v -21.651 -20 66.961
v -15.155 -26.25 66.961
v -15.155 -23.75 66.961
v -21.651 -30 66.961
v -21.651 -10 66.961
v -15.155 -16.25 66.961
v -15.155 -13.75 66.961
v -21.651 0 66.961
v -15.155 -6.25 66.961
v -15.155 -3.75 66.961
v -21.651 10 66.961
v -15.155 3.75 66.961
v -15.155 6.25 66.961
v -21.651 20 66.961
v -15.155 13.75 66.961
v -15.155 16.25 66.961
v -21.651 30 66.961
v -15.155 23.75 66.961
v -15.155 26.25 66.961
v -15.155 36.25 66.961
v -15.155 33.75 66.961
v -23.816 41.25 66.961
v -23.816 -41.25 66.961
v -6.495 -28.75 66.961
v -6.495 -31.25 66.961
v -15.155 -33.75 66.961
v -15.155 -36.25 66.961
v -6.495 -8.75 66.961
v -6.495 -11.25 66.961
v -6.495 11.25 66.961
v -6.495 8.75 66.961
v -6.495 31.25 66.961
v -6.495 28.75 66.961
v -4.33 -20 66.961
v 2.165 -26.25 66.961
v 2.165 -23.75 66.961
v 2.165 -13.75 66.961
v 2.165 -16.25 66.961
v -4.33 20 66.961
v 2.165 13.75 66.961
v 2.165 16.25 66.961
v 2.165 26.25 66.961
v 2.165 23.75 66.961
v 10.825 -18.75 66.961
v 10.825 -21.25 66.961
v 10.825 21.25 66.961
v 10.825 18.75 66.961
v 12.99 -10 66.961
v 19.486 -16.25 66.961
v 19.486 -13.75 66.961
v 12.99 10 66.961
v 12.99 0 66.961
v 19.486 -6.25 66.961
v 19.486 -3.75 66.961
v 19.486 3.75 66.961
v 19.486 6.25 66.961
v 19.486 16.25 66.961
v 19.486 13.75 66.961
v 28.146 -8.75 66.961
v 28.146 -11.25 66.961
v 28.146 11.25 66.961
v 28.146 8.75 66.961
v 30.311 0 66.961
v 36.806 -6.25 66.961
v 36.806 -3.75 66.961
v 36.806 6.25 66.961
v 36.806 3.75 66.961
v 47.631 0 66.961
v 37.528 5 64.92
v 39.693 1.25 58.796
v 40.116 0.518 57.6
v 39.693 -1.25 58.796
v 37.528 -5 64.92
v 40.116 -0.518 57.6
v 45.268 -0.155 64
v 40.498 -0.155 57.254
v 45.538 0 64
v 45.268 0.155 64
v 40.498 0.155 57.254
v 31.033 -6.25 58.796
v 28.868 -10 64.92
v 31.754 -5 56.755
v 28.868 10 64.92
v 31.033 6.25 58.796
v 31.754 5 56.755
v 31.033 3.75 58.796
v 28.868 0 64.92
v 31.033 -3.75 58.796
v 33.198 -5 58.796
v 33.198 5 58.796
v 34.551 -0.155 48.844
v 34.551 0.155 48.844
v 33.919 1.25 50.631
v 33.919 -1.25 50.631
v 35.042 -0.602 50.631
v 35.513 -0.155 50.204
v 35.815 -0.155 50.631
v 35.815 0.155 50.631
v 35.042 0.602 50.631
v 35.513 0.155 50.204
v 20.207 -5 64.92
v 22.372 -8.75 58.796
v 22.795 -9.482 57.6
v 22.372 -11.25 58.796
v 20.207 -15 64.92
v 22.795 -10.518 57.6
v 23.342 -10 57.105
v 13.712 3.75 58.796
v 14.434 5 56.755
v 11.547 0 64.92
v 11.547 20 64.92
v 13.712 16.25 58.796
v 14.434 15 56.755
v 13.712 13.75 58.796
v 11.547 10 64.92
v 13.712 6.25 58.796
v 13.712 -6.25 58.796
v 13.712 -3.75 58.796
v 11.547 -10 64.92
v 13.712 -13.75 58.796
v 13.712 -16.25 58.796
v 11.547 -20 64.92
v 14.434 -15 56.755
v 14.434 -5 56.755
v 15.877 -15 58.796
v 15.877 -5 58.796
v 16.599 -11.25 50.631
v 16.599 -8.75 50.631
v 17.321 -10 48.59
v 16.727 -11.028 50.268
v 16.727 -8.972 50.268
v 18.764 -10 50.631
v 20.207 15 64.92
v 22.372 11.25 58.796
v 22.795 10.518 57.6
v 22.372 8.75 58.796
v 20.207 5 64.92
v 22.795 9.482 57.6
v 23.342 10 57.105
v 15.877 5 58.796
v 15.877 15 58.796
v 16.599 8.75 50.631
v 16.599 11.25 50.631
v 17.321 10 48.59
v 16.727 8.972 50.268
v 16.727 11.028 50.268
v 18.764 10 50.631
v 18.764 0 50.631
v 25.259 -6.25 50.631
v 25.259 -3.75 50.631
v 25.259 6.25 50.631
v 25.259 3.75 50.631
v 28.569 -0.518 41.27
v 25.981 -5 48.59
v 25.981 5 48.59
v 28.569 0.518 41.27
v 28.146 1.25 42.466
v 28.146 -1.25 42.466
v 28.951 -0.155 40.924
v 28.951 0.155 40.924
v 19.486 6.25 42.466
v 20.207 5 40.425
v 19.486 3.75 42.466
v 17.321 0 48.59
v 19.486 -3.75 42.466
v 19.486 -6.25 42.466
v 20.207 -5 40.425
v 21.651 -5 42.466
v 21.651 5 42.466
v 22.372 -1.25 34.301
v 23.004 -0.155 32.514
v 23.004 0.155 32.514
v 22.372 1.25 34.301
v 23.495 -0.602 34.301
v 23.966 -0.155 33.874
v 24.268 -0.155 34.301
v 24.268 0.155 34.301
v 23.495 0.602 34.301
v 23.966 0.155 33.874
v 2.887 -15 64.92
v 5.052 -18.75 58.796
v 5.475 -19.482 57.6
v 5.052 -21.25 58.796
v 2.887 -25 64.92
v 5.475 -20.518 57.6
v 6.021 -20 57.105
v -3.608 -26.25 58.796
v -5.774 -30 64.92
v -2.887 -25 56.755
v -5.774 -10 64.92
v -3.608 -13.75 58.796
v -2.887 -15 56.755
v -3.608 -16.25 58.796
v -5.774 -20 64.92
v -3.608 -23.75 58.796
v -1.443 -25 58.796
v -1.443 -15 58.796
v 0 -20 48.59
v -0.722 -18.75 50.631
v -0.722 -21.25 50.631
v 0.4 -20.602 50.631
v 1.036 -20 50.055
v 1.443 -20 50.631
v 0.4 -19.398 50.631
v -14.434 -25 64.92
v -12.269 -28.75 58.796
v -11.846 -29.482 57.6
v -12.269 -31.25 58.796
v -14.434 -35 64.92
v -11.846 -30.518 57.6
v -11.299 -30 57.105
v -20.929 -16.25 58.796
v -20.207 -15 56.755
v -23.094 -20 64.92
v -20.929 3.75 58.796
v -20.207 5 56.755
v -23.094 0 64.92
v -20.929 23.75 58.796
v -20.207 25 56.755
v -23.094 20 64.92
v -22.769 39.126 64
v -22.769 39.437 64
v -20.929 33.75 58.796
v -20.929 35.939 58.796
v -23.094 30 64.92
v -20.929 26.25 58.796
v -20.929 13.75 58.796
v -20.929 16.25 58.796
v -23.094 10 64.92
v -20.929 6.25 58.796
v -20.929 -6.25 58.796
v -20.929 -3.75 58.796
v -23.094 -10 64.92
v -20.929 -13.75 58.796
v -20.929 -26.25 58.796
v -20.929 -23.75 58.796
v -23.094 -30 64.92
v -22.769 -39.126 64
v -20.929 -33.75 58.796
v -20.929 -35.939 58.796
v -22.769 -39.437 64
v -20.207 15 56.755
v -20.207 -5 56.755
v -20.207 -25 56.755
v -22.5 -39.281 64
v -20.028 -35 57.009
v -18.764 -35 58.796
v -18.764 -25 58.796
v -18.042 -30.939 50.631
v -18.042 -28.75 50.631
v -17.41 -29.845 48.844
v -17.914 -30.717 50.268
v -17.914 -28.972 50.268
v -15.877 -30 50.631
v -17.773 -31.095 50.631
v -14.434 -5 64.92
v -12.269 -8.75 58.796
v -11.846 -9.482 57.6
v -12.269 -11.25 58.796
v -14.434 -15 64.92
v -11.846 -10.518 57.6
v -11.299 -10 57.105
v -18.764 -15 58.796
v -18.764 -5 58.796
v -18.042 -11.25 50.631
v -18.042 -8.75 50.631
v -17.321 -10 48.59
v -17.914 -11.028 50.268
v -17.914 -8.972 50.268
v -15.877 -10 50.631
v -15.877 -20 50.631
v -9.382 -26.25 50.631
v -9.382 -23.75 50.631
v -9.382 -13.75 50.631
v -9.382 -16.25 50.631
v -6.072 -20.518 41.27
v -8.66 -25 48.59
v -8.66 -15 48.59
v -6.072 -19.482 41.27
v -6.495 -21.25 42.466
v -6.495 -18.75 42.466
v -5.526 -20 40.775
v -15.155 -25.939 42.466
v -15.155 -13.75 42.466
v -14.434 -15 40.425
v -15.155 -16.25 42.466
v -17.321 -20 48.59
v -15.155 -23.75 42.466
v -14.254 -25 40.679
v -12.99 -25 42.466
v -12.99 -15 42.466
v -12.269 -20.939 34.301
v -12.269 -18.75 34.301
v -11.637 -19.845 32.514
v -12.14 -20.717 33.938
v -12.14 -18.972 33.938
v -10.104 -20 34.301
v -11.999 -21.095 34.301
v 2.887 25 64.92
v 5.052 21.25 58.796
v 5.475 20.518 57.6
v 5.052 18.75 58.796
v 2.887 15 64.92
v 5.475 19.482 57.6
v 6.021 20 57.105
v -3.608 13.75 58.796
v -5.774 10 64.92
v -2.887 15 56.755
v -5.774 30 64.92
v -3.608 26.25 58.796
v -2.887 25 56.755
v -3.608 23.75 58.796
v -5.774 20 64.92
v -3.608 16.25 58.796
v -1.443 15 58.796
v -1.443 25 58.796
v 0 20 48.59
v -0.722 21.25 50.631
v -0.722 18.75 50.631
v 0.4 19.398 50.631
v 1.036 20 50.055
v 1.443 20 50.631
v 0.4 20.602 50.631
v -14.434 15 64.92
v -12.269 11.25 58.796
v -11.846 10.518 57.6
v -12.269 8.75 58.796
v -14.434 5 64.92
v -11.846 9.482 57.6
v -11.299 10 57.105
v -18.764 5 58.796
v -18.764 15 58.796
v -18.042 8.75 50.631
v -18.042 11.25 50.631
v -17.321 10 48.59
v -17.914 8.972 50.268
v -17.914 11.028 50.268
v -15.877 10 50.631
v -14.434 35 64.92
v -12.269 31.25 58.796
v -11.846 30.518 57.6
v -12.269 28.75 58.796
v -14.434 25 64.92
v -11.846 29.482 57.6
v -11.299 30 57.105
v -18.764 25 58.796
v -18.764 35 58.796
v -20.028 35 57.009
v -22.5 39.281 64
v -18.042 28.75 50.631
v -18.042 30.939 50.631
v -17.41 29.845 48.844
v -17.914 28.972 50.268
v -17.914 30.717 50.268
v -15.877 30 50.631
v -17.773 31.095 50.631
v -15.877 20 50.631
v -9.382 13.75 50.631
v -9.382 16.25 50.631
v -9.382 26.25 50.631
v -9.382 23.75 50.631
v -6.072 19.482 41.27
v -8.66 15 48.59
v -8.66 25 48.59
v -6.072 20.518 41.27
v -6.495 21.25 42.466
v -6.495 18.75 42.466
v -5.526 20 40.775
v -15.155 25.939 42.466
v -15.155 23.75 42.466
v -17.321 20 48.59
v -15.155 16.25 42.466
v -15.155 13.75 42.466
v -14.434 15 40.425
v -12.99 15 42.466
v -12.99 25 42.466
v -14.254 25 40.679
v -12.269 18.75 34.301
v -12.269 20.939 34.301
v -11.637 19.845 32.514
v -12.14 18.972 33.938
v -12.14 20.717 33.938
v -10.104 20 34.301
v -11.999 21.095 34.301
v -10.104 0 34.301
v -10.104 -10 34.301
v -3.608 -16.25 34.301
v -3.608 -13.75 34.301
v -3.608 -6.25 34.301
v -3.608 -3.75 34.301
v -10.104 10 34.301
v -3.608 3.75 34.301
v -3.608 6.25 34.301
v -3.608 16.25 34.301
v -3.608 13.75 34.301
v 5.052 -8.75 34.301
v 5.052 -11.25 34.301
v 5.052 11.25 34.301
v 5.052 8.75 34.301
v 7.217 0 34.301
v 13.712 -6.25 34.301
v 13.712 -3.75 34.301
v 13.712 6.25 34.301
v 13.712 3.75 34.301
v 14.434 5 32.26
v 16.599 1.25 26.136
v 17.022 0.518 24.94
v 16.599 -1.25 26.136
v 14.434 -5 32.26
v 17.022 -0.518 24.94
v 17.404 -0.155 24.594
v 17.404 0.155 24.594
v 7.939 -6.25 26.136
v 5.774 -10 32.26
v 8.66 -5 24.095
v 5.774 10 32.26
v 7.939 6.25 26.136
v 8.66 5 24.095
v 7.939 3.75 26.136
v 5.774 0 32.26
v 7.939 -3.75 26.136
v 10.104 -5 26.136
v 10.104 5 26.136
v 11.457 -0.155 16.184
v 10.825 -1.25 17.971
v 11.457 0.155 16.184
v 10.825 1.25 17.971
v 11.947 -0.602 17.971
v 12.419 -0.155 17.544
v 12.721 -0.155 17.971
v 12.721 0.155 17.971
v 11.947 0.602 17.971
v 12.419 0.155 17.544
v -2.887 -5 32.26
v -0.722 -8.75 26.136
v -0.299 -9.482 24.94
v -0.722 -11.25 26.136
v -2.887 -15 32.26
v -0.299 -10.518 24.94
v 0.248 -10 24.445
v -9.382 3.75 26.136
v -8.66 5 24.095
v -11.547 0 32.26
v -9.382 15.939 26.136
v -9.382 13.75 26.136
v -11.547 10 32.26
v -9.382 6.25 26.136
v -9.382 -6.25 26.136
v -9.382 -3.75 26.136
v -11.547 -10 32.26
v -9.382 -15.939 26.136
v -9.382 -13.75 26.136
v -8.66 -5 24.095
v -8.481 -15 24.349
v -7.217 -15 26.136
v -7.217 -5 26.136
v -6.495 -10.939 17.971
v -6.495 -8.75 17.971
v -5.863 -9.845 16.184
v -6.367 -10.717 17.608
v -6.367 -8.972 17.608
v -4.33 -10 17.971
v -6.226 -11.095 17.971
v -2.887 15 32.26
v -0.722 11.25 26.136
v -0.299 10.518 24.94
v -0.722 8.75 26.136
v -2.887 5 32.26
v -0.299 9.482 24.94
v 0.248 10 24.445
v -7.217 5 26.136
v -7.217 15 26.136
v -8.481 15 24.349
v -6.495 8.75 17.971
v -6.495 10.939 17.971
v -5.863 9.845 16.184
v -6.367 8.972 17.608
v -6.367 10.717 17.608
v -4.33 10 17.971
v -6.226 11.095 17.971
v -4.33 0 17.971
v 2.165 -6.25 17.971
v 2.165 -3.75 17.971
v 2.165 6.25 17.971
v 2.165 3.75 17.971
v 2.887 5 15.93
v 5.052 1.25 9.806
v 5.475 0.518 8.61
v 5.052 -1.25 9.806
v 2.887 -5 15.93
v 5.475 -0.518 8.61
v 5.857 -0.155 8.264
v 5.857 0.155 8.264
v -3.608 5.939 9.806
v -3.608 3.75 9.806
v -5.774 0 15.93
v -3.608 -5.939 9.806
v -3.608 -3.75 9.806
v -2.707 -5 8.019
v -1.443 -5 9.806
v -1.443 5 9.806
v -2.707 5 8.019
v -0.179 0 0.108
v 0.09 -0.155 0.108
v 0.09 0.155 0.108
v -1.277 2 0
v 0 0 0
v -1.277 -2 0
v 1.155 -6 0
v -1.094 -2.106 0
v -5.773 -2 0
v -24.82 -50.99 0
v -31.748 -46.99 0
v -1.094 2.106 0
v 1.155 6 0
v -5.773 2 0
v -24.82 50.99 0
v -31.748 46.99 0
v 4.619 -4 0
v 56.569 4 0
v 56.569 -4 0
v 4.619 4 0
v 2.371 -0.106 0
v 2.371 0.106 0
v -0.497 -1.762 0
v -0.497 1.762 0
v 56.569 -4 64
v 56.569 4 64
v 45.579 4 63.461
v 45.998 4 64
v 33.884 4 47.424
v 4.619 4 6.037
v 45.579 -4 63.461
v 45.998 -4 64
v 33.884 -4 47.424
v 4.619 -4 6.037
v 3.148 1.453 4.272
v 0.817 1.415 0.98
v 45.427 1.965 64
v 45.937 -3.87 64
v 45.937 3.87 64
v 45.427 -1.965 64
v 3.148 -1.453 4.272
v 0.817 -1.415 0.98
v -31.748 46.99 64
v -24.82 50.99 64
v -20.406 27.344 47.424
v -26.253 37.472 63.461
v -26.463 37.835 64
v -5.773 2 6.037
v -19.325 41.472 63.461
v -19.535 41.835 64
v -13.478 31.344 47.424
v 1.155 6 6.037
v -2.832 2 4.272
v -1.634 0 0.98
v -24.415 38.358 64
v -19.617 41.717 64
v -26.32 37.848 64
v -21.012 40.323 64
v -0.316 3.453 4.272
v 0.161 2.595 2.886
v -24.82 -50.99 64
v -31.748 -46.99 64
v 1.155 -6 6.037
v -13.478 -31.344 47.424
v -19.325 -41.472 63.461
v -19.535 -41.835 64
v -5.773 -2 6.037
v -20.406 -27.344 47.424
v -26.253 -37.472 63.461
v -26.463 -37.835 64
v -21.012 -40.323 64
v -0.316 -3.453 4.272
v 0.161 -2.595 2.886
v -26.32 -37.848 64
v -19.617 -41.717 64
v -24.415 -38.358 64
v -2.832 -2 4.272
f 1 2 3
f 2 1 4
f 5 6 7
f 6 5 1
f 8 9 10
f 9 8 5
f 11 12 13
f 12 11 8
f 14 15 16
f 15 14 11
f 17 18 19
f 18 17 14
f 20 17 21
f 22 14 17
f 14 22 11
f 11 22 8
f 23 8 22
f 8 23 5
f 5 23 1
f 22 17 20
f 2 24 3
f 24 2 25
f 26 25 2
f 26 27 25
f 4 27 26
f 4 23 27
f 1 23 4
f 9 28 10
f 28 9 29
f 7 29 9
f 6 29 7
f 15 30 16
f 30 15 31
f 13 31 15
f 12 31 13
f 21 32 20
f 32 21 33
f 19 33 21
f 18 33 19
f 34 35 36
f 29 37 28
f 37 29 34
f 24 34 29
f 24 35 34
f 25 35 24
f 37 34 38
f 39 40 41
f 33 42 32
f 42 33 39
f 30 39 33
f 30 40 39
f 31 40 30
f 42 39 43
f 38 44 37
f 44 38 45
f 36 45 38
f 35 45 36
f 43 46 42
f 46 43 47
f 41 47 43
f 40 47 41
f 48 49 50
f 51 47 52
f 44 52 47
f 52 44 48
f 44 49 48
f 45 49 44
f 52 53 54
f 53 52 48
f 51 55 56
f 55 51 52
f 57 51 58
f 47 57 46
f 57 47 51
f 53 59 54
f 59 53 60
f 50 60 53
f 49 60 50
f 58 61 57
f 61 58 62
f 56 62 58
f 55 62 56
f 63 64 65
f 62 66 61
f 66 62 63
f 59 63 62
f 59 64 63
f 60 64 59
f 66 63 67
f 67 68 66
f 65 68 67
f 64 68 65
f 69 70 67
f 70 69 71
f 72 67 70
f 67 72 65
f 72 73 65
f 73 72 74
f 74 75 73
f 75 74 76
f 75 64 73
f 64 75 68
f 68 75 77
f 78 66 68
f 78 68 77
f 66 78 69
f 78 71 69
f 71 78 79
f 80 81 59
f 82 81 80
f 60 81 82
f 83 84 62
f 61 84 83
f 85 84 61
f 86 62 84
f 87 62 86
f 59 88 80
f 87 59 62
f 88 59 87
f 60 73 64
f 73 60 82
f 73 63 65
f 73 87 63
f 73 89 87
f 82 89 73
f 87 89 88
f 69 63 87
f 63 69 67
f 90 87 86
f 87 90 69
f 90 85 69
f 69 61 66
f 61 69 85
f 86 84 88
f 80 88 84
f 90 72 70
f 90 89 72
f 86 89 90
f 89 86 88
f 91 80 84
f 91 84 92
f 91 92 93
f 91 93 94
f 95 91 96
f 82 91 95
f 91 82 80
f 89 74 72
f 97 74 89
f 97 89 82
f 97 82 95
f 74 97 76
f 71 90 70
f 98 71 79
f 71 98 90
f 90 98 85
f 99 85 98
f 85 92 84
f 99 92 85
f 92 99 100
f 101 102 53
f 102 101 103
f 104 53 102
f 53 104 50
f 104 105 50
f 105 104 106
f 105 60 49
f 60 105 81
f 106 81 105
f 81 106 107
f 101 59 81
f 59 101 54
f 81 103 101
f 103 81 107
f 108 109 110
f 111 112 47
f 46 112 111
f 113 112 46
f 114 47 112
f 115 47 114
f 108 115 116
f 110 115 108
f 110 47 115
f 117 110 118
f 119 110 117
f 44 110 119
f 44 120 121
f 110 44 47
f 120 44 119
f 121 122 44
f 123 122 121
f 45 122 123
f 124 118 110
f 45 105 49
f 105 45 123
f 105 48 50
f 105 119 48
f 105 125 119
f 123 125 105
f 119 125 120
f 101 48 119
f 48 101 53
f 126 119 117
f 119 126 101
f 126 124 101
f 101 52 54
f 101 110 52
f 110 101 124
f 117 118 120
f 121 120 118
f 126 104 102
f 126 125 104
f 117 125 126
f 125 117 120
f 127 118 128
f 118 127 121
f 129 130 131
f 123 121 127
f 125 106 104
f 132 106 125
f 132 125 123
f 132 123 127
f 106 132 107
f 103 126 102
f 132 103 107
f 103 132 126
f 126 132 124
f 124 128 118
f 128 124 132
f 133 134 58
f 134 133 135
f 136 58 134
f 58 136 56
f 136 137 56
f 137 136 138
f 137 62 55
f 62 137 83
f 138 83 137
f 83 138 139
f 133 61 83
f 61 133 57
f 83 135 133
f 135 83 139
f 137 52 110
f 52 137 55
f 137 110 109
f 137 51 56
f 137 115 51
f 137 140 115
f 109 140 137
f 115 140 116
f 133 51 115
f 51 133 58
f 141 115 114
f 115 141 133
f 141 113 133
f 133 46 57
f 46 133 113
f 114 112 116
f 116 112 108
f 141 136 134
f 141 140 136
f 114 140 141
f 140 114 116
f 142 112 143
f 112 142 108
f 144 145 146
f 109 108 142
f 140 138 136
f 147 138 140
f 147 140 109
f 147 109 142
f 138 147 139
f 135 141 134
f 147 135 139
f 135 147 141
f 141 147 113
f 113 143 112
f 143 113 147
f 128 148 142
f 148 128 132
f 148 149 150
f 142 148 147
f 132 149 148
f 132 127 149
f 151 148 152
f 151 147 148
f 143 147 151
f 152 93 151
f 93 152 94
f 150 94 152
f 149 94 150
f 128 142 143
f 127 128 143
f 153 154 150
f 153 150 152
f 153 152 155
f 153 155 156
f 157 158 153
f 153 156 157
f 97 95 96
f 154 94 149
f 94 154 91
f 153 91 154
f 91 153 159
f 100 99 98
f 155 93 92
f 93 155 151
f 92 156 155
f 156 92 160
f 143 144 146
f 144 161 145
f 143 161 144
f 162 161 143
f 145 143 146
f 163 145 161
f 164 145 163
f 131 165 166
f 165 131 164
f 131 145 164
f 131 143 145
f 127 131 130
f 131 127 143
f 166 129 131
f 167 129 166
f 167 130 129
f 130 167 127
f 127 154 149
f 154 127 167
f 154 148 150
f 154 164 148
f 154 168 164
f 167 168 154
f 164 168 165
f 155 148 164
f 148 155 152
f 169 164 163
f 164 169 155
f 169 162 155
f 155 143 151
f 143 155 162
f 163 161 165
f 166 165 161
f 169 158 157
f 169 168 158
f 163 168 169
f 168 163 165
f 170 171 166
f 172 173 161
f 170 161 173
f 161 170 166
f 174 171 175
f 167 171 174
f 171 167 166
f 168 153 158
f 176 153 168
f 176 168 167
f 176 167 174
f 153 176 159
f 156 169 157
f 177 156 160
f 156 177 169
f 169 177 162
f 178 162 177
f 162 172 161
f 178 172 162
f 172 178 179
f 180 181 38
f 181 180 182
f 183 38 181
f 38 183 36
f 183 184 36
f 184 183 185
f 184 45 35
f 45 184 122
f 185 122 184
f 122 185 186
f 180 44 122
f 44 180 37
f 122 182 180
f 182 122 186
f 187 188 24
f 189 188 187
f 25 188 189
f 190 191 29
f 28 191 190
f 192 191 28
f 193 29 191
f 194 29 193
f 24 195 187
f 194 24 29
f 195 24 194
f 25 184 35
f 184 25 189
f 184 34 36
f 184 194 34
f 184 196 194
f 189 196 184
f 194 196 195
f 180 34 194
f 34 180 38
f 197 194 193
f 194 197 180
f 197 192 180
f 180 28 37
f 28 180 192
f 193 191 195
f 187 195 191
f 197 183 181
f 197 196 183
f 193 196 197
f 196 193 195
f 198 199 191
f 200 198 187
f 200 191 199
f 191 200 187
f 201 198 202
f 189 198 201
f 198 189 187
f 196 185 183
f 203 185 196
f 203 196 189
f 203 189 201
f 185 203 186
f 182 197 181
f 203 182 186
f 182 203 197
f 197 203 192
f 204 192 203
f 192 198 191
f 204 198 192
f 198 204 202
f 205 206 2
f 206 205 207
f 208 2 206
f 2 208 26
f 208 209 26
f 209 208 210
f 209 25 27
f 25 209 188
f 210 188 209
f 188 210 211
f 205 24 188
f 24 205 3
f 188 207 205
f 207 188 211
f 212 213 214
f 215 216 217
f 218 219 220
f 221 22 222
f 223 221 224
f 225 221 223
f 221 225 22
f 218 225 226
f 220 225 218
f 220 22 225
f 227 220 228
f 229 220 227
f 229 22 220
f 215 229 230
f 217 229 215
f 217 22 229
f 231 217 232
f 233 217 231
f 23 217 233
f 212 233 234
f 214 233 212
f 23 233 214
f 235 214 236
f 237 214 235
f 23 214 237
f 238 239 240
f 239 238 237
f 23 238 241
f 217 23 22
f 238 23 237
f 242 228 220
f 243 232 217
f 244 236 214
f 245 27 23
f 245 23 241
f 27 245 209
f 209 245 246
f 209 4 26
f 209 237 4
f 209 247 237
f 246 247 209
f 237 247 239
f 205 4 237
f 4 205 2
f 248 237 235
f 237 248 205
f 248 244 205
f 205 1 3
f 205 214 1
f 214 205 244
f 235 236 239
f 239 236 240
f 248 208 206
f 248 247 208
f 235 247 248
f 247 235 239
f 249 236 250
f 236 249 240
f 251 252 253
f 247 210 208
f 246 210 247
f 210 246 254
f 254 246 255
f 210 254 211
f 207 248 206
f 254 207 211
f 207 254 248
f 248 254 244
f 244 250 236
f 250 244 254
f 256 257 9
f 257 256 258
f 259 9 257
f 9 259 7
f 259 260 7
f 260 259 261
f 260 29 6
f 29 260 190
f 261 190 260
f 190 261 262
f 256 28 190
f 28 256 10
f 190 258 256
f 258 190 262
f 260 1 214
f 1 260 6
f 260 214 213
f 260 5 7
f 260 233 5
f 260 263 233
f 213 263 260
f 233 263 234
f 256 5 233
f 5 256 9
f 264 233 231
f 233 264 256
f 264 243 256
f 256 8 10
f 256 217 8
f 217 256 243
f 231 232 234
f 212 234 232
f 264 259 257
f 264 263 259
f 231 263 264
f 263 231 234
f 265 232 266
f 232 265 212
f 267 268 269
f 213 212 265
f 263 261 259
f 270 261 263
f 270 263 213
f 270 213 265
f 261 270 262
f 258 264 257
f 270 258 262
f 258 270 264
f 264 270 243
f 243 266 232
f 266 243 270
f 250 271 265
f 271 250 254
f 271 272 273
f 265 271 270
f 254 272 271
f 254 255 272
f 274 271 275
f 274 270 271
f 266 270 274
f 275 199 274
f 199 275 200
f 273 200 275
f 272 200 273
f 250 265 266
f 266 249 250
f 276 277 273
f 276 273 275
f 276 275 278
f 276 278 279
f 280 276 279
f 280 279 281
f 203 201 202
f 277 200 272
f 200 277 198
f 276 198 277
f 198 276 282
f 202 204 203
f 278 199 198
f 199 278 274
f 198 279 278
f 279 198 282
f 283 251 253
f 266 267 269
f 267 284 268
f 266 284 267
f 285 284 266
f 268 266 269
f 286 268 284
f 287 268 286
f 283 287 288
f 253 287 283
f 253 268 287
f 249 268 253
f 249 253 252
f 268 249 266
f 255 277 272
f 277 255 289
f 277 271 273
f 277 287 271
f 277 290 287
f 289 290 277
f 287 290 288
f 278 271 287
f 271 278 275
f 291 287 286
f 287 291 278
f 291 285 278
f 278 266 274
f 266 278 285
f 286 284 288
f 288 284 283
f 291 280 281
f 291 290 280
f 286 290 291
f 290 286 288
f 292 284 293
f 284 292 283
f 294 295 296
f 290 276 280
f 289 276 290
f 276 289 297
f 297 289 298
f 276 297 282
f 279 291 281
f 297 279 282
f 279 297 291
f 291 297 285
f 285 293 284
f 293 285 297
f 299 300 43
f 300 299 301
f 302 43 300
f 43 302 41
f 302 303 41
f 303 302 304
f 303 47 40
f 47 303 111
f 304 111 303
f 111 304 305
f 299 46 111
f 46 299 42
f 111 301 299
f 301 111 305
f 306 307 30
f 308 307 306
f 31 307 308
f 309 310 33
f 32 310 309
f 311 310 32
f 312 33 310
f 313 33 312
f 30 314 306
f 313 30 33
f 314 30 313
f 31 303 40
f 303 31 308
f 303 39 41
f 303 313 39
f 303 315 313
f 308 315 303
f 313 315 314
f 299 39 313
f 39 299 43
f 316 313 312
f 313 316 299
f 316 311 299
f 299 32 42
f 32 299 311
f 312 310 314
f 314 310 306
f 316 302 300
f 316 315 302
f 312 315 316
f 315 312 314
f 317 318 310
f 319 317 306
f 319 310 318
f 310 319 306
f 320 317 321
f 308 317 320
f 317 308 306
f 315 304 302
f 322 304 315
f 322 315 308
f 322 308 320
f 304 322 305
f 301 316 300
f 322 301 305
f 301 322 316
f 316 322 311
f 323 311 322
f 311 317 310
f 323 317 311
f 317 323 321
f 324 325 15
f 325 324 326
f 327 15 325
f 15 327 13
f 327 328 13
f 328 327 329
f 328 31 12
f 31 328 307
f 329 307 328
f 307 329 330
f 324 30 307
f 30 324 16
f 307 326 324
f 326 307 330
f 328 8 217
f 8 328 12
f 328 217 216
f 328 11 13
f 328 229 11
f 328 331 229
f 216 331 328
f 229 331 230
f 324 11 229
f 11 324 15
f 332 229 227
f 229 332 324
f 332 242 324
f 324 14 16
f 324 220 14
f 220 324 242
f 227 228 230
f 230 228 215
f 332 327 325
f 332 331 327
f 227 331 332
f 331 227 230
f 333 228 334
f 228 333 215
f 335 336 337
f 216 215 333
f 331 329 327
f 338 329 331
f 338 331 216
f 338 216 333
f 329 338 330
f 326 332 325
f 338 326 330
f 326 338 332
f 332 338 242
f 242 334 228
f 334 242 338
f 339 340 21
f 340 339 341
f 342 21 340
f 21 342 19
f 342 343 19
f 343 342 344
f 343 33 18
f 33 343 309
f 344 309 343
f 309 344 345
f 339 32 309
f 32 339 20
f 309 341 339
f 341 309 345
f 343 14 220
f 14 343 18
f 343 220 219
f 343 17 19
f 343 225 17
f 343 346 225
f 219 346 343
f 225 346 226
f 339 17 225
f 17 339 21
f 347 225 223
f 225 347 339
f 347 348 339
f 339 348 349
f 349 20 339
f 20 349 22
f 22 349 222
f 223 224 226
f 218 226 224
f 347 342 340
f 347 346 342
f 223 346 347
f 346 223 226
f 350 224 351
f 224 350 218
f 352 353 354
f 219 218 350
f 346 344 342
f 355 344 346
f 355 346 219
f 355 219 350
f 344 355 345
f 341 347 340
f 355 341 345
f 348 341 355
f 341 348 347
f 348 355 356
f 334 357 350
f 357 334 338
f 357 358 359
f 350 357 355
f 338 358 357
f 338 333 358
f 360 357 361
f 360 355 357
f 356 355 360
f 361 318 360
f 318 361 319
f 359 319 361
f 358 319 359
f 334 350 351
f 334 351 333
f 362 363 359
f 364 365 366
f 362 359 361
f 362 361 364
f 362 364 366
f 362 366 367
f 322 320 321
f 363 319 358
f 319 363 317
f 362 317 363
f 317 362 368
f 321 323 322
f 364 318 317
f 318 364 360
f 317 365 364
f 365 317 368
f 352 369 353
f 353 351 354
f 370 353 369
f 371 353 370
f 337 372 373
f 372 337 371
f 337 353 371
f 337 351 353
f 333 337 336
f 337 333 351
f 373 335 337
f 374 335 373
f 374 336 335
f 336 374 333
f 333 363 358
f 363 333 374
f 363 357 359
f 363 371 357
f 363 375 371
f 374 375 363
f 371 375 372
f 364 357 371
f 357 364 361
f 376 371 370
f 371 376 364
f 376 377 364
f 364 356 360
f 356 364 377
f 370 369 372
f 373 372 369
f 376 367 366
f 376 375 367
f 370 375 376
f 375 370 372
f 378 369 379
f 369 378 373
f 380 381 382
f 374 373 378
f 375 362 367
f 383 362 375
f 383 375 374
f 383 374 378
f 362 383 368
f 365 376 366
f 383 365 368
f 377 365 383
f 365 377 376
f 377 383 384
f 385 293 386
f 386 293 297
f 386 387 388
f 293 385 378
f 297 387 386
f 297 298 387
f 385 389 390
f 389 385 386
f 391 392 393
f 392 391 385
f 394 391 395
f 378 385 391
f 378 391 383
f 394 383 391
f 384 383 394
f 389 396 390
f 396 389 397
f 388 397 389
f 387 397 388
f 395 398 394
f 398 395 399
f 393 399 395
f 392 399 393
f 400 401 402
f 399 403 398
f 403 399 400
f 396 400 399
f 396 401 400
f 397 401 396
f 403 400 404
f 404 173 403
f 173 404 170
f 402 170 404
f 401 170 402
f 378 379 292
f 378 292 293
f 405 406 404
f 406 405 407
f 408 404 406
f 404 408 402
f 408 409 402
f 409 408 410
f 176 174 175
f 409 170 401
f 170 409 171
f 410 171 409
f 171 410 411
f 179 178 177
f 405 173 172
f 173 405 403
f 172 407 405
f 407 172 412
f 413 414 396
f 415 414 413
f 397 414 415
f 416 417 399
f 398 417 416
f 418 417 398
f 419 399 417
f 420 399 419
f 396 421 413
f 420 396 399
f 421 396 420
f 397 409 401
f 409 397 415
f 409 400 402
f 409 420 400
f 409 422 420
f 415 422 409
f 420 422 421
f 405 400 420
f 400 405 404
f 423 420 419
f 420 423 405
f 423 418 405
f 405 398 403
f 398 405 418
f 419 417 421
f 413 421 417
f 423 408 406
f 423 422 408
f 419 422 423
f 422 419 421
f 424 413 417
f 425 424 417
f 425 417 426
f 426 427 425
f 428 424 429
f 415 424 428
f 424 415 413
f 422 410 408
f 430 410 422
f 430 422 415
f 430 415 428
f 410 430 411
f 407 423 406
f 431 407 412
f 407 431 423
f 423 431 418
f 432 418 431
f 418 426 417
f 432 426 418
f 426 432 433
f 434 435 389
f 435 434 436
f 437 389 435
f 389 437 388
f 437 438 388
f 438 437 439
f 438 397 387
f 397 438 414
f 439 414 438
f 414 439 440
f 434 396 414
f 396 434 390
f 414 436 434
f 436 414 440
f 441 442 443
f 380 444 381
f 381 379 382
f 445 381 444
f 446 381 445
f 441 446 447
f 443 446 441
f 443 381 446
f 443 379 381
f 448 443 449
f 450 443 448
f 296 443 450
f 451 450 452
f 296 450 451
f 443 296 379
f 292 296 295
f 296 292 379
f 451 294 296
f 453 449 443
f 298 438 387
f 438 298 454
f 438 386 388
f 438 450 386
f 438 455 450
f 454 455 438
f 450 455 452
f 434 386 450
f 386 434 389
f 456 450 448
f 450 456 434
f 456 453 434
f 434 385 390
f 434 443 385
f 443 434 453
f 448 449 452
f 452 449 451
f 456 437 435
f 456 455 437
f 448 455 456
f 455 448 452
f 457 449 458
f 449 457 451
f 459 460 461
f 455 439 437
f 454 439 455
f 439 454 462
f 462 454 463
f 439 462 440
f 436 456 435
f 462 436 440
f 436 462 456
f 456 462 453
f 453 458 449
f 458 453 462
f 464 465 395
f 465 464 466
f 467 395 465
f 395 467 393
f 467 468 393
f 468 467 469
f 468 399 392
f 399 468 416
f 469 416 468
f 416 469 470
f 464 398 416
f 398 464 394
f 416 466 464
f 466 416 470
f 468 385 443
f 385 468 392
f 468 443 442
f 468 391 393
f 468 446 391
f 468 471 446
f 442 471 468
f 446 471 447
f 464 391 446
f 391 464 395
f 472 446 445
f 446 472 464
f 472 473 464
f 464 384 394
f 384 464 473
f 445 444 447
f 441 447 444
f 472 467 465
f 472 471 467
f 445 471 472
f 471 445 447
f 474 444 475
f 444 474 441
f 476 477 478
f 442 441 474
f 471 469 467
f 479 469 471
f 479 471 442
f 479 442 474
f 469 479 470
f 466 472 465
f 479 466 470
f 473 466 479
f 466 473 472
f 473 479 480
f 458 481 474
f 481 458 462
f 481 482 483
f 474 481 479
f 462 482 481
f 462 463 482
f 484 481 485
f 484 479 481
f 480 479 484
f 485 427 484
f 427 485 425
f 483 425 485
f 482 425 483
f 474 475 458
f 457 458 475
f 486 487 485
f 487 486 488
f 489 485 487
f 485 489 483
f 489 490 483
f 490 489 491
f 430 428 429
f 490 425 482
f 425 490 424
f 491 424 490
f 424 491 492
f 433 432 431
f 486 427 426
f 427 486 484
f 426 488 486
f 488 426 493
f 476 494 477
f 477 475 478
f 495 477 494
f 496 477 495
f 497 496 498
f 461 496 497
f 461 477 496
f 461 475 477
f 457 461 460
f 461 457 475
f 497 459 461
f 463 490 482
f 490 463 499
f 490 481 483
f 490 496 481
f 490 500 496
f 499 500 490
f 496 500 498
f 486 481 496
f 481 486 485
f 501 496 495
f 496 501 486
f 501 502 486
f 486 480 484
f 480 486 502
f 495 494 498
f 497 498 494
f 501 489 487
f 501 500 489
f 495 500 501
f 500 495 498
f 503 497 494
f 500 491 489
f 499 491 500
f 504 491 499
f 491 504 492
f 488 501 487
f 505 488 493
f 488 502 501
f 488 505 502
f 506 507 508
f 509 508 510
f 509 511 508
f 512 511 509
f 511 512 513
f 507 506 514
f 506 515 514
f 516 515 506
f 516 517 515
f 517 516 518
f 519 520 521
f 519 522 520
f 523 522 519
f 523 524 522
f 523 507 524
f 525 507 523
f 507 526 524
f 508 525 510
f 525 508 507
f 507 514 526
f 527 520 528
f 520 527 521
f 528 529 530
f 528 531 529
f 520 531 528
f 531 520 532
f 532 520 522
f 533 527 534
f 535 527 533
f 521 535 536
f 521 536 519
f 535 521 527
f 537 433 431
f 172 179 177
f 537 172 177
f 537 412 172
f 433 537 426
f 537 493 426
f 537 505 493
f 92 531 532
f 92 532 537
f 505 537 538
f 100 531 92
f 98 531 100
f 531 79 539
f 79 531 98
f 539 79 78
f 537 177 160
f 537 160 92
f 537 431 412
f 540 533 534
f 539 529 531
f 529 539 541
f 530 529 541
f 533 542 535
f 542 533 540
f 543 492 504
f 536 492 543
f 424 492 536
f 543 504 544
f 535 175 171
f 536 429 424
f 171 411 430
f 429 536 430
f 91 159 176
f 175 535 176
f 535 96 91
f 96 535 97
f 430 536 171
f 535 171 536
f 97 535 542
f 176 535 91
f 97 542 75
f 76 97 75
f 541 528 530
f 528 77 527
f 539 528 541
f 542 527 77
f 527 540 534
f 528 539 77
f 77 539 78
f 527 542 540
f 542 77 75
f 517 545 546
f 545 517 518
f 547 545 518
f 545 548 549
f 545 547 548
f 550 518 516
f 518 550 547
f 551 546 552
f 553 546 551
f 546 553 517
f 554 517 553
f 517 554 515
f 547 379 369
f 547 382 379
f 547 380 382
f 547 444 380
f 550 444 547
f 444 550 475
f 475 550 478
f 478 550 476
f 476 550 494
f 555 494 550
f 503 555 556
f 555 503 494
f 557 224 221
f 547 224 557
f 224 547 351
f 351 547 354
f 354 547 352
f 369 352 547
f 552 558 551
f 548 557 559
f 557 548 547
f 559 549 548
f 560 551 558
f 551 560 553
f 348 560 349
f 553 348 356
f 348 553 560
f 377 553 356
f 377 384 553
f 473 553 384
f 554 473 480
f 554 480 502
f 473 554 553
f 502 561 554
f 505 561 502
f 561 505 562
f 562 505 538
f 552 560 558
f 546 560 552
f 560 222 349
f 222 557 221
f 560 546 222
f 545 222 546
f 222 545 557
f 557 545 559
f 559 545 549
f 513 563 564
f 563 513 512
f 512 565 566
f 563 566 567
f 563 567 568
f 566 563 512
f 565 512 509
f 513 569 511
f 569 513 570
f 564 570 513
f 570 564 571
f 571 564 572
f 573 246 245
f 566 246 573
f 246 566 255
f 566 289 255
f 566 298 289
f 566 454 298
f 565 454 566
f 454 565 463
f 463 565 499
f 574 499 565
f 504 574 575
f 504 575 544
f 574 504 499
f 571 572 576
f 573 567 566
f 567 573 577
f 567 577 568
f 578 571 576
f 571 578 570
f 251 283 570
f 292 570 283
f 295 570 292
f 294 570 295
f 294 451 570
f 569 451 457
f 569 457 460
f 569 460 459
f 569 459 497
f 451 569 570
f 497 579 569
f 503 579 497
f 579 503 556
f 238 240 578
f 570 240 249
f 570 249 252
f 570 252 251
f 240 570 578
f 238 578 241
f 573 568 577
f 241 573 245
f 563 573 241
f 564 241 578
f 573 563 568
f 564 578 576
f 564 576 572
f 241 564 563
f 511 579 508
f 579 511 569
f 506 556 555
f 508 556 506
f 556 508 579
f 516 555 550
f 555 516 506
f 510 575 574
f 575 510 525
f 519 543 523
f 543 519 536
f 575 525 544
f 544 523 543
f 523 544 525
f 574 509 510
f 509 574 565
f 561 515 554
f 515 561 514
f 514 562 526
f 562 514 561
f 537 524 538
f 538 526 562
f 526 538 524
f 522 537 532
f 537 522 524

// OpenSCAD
/**
 * sierpinski-triangle.scad: Recursively defined Sierpinksi tetrahedron.
 **
 * This program is free software: you can redistribute it and/or modify
 * it under the terms of the GNU General Public License as published by
 * the Free Software Foundation, either version 3 of the License, or
 * (at your option) any later version.
 *
 * This program is distributed in the hope that it will be useful,
 * but WITHOUT ANY WARRANTY; without even the implied warranty of
 * MERCHANTABILITY or FITNESS FOR A PARTICULAR PURPOSE.  See the
 * GNU General Public License for more details.
 *
 * You should have received a copy of the GNU General Public License
 * along with this program.  If not, see <http://www.gnu.org/licenses/>.
 */

// Original by Chris Granade (cgranade)
//  http://www.thingiverse.com/thing:187131
//
// Modified by Bill Owens, February 2014
//  - added external support to allow clean printing on a fused-filament printer

// for Thingiverse Customizer

/* Global */

// Order/level of the Sierpinski tetrix
order=3; // [0,1,2,3,4]

// Size of the tetrix (edge length) in mm
size=80;

// Adjustment to the size of the tetrahedra to allow for some adhesion between them
adhesion=0.25;

// Intersection between the support and the tetrix - larger makes more solid support, but harder to remove
stick=0.005;


TETRA_POINTS = [
    [1/sqrt(3), 0, 0],
    [-1/(2*sqrt(3)), 1/2, 0],
    [-1/(2*sqrt(3)), -1/2, 0],
    [0, 0, sqrt(2/3)]
];

module tetra() {
    polyhedron(
        points=TETRA_POINTS,
        triangles=[
            [0, 1, 2],
            [2, 1, 3],
            [0, 2, 3],
            [0, 3, 1]
    ]);
}

module sier(n, overscale=0.2) {
    if (n == 0) {
        scale(1 + overscale)
        tetra();
    } else {
        for (pt = TETRA_POINTS) {
            translate(pow(2, n - 1) * pt)
            sier(n - 1, overscale);
        }
    }
}

module support(s) {
	difference() {
		cylinder(r1=s/sqrt(2), r2=0, h=s, $fn=36);
		difference() {
			cube(size=[s*3,s*3,s*2], center=true);
			translate([-s,0,0]) cube(size=[s*2,s*.1,s*2], center=true);
		}
		translate([0,0,s*1.3]) cube(size=[s*5,s*5,s], center=true);
	}
}
	
scale(size) 
  union() { 		
	difference() {
	rotate([180,0,0]) translate([0,0,-sqrt(2/3)*(1+(adhesion/pow(2,order)))+stick]) scale(1/pow(2,order)) sier(order, overscale=adhesion);			// the tetrix itself
	translate([0,0,-1]) cube(size=[2,2,2], center=true);	// trim anything below Z=0
	}
	difference() {										// the support structure
		union() {
			translate([1/sqrt(2),0,0]) support(1);
			rotate([0,0,120]) translate([1/sqrt(2),0,0]) support(1);
			rotate([0,0,-120]) translate([1/sqrt(2),0,0]) support(1);
		}
		rotate([0,20,180]) translate([1/2*1.03,0,1/3]) cube(size=[1,0.05,1], center=true);
		rotate([0,20,300]) translate([1/2*1.03,0,1/3]) cube(size=[1,0.05,1], center=true);
		rotate([0,20,-300]) translate([1/2*1.03,0,1/3]) cube(size=[1,0.05,1], center=true);
	}
 
}
